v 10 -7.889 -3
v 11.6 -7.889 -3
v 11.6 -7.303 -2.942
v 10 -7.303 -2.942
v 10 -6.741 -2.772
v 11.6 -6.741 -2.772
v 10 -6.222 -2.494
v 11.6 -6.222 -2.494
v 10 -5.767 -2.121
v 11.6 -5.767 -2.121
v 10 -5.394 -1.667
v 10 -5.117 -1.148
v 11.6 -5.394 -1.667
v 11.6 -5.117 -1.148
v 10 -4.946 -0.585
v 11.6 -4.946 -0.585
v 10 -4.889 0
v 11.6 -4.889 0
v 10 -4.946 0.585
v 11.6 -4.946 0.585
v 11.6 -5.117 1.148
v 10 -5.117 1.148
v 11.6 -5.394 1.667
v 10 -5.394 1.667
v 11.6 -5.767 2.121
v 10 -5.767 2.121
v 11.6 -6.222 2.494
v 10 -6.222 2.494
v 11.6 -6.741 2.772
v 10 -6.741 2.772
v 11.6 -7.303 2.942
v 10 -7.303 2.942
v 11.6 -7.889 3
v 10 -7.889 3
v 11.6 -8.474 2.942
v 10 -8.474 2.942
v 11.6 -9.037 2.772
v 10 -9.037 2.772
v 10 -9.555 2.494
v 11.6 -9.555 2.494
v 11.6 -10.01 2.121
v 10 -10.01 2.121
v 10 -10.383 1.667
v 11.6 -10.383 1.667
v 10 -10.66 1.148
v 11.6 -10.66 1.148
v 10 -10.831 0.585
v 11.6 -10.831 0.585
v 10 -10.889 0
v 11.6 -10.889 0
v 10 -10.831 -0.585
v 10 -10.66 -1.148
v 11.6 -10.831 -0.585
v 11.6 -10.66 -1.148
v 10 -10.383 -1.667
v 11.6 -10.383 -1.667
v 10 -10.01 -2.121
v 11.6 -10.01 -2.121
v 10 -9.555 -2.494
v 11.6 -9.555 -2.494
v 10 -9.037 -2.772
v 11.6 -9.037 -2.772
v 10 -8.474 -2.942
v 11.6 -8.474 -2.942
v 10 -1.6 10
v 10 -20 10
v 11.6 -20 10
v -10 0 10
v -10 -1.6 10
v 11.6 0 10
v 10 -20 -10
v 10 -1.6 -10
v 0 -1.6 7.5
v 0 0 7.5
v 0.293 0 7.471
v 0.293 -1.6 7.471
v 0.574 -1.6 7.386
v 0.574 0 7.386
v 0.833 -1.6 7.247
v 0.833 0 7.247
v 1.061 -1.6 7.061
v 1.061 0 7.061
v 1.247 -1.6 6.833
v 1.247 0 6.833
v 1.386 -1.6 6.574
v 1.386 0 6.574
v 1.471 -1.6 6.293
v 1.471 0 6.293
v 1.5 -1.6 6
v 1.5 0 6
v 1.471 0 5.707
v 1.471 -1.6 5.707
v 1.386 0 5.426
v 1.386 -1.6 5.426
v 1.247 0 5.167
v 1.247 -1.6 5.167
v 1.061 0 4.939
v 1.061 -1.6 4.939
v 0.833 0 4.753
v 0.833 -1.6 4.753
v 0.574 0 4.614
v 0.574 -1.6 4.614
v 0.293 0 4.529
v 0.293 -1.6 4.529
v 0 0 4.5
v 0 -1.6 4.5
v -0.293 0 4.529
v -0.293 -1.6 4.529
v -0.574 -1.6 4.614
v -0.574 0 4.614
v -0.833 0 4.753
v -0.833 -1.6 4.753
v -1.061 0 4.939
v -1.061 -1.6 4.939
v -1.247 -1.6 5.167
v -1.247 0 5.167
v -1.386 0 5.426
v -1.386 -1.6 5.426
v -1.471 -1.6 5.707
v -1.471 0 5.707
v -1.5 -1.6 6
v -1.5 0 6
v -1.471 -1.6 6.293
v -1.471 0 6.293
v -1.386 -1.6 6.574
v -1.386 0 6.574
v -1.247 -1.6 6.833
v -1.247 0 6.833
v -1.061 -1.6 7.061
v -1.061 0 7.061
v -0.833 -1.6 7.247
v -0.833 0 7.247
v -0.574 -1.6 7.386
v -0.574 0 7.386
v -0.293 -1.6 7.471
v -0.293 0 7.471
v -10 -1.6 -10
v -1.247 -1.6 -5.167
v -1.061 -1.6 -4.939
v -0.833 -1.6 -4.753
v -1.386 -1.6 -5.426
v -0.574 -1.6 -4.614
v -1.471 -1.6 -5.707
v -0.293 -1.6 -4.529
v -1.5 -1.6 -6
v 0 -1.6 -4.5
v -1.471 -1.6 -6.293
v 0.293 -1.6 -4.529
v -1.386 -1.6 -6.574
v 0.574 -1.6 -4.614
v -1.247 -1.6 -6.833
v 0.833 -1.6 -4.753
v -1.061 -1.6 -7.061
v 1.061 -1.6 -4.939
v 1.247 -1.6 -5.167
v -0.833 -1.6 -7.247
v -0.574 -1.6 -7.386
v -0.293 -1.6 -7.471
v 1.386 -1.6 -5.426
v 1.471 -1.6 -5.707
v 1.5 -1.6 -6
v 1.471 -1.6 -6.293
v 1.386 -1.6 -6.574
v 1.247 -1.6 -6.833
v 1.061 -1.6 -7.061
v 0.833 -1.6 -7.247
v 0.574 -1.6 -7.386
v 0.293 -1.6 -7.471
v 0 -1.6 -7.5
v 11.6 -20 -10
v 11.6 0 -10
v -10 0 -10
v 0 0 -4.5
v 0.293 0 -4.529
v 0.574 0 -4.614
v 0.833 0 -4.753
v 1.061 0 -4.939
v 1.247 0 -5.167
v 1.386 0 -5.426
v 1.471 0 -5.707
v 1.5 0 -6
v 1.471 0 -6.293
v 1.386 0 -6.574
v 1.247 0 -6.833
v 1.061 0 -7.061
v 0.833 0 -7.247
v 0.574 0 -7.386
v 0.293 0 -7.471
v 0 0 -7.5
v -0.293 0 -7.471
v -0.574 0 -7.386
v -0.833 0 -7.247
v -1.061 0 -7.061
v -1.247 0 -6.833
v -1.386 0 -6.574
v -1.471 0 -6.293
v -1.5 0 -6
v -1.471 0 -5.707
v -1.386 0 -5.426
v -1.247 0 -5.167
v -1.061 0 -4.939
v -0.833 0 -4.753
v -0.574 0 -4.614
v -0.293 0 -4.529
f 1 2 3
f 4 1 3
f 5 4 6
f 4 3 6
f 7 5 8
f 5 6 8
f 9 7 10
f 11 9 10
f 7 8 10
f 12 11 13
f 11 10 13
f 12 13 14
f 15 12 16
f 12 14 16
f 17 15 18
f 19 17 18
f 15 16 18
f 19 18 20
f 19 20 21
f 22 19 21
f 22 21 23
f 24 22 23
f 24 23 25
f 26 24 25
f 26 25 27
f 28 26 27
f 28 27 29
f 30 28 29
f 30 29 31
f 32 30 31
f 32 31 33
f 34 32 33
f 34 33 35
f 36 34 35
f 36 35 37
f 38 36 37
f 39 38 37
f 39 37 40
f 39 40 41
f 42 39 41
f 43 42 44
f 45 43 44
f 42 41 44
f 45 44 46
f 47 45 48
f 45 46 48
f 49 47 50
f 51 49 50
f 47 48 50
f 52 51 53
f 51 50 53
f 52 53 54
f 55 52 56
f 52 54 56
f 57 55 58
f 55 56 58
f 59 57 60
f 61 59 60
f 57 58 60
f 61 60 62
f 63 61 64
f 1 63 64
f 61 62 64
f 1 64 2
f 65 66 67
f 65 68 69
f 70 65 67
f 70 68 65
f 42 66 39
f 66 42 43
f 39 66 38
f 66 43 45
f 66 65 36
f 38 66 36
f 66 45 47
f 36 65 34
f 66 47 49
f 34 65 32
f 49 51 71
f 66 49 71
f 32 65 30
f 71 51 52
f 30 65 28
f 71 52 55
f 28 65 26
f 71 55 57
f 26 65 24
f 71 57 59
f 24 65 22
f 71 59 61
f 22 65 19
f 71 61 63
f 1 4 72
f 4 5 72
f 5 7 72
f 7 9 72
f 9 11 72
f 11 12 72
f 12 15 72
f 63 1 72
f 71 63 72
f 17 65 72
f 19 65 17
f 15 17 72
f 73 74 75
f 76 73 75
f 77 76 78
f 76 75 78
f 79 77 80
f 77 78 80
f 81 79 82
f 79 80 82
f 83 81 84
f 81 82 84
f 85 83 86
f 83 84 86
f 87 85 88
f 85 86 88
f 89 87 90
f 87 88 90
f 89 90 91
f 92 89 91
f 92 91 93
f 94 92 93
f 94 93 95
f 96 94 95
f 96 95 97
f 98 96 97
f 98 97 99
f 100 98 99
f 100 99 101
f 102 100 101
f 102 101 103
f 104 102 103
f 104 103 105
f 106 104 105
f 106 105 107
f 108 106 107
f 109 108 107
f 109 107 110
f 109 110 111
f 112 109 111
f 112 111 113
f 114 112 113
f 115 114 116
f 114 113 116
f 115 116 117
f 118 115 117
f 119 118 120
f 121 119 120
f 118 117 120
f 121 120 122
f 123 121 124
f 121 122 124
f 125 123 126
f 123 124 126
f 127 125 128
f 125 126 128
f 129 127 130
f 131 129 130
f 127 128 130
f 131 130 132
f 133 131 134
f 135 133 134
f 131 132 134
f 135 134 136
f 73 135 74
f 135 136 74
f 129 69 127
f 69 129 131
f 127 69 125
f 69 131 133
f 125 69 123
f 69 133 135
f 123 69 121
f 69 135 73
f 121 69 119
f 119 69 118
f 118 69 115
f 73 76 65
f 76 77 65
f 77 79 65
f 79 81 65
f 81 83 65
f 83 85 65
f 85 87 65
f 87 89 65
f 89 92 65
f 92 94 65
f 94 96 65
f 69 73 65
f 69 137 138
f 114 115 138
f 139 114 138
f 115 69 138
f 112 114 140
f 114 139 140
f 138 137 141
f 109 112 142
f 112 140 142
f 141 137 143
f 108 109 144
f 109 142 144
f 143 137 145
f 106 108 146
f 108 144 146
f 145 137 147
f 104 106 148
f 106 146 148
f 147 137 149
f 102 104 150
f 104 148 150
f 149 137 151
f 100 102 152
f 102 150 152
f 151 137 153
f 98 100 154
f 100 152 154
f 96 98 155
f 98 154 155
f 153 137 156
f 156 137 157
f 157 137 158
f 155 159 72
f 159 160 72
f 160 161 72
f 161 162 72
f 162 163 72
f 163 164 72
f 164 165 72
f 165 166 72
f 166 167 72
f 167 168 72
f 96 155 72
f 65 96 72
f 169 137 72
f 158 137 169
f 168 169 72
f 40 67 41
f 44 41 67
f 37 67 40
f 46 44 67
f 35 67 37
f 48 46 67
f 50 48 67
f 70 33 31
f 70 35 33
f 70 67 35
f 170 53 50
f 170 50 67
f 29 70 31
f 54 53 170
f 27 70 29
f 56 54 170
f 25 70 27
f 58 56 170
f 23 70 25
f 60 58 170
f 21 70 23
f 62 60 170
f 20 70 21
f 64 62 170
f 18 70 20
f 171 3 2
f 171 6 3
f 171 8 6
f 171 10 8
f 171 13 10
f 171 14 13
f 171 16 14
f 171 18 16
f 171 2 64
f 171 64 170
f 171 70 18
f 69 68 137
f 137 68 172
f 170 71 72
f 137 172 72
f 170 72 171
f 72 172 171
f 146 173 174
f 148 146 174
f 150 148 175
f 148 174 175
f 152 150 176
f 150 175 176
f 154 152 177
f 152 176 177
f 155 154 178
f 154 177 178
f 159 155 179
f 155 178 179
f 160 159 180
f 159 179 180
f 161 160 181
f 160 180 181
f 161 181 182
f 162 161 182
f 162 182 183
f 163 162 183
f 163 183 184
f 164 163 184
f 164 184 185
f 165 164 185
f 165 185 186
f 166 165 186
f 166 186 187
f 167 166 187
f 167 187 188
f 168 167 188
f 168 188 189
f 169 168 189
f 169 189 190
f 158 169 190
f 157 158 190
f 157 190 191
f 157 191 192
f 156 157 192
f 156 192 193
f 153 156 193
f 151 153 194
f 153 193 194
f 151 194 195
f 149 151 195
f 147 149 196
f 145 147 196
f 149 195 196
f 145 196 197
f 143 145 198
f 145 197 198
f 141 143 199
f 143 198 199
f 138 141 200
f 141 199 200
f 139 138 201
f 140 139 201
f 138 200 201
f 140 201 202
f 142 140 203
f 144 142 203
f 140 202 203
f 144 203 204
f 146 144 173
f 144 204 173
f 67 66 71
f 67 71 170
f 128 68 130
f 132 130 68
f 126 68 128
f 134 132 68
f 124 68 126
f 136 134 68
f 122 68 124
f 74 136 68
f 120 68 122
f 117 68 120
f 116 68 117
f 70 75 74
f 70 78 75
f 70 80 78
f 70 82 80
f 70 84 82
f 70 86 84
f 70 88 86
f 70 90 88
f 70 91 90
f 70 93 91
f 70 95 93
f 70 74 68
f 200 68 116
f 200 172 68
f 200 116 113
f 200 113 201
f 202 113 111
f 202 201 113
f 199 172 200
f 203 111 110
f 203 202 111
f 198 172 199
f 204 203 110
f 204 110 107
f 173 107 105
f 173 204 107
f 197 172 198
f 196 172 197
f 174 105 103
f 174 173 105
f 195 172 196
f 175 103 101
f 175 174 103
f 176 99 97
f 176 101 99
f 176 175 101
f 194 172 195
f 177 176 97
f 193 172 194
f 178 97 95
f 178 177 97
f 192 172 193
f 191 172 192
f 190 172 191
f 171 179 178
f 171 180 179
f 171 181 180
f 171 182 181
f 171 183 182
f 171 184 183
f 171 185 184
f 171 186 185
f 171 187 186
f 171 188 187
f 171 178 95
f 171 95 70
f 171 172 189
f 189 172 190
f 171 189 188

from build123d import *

# Parameters (mm, degrees)
SKETCH2_W           = 20
SKETCH2_H           = 20
BOSS_EXTRUDE1_DEPTH = 1.6
SKETCH2_4_W         = 1.6
SKETCH2_4_H         = 20
BOSS_EXTRUDE2_DEPTH = 20
SKETCH3_R           = 3
CUT_EXTRUDE1_DEPTH  = 3
SKETCH4_R           = 1.5
CUT_EXTRUDE2_DEPTH  = 2


with BuildPart() as part:
    # Sketch2 → Boss-Extrude1 (new body)
    with BuildSketch(Plane(origin=(0, 0, 0), x_dir=(1, 0, 0), z_dir=(0, 1, 0))):
        Rectangle(SKETCH2_W, SKETCH2_H)
    extrude(amount=-BOSS_EXTRUDE1_DEPTH)

    # Sketch2<4> → Boss-Extrude2 (add)
    with BuildSketch(Plane(origin=(0, 0, 0), x_dir=(1, 0, 0), z_dir=(0, 1, 0))):
        with Locations((10.8, 0)):
            Rectangle(SKETCH2_4_W, SKETCH2_4_H)
    extrude(amount=-BOSS_EXTRUDE2_DEPTH)

    # Sketch3 → Cut-Extrude1 (cut)
    with BuildSketch(Plane(origin=(11.6, 0, 0), x_dir=(0, 0, -1), z_dir=(1, 0, 0))):
        with Locations((0, -7.888677581)):
            Circle(SKETCH3_R)
    extrude(amount=-CUT_EXTRUDE1_DEPTH, mode=Mode.SUBTRACT)

    # Sketch4 → Cut-Extrude2 (cut)
    with BuildSketch(Plane(origin=(0, 0, 0), x_dir=(1, 0, 0), z_dir=(0, 1, 0))):
        with Locations((0, 6)):
            Circle(SKETCH4_R)
        with Locations((0, -6)):
            Circle(SKETCH4_R)
    extrude(amount=-CUT_EXTRUDE2_DEPTH, mode=Mode.SUBTRACT)


solid = part.part
